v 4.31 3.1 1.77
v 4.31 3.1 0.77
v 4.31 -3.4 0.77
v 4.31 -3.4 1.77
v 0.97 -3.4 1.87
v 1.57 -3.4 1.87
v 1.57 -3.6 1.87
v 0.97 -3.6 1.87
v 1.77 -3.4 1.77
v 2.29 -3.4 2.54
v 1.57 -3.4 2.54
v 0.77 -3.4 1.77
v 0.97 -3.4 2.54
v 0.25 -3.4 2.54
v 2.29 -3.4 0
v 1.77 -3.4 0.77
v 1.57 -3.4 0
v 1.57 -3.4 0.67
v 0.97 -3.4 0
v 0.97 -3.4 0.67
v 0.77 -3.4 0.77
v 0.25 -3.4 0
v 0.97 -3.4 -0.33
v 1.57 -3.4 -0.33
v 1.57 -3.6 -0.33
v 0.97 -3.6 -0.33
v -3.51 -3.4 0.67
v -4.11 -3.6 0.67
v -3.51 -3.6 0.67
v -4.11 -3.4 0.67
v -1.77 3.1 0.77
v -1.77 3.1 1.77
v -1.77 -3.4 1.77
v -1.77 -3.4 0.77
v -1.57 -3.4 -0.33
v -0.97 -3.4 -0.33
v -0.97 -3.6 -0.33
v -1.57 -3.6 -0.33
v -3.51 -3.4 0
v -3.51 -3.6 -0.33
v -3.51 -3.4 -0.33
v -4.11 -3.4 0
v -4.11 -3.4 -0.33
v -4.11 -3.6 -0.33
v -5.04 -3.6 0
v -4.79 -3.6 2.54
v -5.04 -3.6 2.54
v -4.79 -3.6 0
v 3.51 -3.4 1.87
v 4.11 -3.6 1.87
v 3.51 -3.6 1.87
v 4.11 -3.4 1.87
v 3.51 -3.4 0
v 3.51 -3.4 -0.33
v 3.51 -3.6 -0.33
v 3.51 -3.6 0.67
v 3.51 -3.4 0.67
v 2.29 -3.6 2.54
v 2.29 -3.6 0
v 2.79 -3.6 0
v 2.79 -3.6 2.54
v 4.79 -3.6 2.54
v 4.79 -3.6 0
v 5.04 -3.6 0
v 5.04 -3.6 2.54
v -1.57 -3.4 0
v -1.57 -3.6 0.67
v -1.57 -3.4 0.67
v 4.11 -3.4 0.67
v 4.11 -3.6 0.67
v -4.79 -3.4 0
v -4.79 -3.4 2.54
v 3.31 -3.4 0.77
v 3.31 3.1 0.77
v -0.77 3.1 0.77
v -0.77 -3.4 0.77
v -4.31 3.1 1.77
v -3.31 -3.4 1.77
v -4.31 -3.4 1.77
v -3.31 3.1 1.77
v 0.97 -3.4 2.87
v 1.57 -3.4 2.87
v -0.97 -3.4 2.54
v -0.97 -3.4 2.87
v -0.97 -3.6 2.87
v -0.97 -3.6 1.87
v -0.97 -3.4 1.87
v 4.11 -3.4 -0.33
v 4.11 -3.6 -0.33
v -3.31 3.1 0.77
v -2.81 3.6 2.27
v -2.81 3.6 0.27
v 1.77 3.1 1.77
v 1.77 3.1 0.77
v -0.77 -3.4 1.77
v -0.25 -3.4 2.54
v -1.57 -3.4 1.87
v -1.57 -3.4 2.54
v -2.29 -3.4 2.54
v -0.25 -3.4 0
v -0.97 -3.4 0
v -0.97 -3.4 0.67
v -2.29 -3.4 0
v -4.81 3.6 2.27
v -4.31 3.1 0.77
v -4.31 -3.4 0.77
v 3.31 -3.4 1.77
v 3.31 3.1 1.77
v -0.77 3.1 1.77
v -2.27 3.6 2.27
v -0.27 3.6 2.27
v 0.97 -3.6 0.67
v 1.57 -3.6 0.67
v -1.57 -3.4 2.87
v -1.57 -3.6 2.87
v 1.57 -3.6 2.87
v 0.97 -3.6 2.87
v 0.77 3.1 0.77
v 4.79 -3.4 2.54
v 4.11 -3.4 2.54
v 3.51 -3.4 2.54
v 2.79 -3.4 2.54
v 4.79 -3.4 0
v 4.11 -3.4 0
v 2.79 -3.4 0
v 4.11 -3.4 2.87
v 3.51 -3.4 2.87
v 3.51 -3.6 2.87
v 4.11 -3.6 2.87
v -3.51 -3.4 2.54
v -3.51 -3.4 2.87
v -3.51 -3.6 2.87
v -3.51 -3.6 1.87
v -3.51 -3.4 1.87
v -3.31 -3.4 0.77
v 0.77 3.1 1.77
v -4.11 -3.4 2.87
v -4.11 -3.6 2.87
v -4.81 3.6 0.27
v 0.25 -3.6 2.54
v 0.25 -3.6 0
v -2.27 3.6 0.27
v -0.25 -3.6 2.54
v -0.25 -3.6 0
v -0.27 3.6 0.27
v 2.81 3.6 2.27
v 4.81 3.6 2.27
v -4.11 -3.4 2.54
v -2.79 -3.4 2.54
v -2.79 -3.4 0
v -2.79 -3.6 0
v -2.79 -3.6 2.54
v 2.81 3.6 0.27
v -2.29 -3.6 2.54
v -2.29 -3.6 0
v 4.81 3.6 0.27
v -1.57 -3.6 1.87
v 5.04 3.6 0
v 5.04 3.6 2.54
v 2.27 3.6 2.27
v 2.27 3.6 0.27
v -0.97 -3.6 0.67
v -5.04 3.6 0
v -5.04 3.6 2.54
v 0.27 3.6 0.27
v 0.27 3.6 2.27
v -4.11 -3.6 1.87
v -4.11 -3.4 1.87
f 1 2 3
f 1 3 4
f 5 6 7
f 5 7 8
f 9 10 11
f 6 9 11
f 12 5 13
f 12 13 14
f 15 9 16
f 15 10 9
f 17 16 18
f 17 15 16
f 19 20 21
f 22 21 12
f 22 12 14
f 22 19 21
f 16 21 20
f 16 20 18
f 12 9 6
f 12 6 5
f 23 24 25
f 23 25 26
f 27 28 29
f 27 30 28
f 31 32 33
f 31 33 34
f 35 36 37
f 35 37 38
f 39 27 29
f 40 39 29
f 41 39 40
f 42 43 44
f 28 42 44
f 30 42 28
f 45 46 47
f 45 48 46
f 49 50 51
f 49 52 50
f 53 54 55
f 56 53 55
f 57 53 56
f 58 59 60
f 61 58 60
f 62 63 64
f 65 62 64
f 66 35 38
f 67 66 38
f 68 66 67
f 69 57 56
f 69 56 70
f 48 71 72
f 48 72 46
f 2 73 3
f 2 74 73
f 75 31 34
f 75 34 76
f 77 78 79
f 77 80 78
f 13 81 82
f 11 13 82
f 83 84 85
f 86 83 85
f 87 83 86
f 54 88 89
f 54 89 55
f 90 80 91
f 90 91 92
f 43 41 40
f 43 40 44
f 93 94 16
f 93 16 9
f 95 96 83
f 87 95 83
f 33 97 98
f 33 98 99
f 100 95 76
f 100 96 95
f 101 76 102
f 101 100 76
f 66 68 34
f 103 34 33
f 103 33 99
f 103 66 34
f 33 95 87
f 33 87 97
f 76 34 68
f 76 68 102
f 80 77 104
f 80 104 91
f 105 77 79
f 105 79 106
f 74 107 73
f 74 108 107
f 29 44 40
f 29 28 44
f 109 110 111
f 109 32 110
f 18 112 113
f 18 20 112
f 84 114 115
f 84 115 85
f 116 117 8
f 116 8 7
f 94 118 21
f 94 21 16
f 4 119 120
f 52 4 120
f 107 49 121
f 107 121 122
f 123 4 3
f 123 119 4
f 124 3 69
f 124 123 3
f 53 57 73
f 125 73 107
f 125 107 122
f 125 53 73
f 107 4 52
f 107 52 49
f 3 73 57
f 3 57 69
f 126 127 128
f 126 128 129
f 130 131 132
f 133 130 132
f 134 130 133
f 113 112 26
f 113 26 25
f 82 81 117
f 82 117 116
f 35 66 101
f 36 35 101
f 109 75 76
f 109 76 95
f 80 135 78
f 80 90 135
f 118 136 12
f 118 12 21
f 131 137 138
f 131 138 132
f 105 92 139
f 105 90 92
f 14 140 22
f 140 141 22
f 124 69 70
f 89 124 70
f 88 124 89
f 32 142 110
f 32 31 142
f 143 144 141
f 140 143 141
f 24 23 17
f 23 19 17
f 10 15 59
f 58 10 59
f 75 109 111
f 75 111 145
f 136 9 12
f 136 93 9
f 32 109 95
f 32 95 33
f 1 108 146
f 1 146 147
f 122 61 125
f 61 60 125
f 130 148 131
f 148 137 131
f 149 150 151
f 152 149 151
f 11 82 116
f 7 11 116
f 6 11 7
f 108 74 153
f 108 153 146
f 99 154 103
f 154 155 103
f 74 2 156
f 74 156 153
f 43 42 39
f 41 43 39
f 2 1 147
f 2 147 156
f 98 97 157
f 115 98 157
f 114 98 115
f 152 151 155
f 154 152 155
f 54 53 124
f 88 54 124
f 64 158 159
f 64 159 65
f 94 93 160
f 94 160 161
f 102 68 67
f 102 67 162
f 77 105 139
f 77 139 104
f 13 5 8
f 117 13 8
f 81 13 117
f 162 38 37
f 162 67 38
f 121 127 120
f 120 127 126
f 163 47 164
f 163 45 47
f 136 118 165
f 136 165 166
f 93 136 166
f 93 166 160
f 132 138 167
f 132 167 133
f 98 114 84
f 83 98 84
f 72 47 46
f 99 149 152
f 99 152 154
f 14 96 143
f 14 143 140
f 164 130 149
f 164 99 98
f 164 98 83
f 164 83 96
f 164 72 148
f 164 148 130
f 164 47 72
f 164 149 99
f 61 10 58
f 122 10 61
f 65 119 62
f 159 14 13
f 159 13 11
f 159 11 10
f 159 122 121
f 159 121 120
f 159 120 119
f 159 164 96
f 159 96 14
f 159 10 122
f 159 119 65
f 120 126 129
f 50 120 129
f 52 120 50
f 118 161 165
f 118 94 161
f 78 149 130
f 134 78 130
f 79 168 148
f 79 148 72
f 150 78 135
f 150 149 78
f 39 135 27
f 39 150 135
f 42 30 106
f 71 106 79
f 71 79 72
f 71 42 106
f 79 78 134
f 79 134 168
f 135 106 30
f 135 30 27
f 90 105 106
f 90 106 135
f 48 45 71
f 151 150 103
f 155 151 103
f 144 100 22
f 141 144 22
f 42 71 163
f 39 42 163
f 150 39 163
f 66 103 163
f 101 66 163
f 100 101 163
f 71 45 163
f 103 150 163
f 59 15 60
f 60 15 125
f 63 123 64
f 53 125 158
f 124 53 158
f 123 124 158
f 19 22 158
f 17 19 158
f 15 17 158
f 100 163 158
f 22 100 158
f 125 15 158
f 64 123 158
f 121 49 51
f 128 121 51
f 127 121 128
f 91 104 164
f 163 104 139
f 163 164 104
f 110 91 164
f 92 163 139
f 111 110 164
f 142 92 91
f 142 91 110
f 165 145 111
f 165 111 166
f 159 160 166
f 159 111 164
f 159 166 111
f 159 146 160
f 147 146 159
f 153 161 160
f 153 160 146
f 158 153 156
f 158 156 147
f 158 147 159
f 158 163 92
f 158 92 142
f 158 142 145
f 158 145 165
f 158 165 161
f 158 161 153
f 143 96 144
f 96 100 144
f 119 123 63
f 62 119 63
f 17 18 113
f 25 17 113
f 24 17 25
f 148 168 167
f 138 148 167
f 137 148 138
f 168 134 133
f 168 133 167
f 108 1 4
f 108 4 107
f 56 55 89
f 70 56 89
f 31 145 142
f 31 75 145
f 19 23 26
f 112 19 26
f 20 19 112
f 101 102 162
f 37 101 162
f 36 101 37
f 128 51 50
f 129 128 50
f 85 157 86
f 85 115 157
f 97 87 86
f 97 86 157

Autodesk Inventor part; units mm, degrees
ref_plane "YZ Plane" through (0, 0, 0) normal (1, 0, 0) x (0, 1, 0)
ref_plane "XZ Plane" through (0, 0, 0) normal (0, 1, 0) x (-1, 0, 0)
ref_plane "XY Plane" through (0, 0, 0) normal (0, 0, 1) x (1, 0, 0)
sketch "Sketch1" plane through (0, 0, 0) normal (0, 0, 1) x (1, 0, 0)
  line L0 (-5.04, 3.6) -> (5.04, 3.6)
  line L1 (5.04, 3.6) -> (5.04, -3.6)
  line L2 (-5.04, -3.6) -> (-5.04, 3.6)
  line L3 (-2.79, -3.4) -> (-2.79, -3.6)
  line L4 (-2.79, -3.6) -> (-2.29, -3.6)
  line L5 (-2.29, -3.6) -> (-2.29, -3.4)
  line L6 (-0.25, -3.4) -> (-0.25, -3.6)
  line L7 (-0.25, -3.6) -> (0.25, -3.6)
  line L8 (0.25, -3.6) -> (0.25, -3.4)
  line L9 (2.29, -3.4) -> (2.29, -3.6)
  line L10 (2.29, -3.6) -> (2.79, -3.6)
  line L11 (2.79, -3.6) -> (2.79, -3.4)
  line L12 (-2.79, -3.4) -> (-4.79, -3.4)
  line L13 (-0.25, -3.4) -> (-2.29, -3.4)
  line L14 (4.79, -3.4) -> (2.79, -3.4)
  line L15 (2.29, -3.4) -> (0.25, -3.4)
  line L16 (0, 1.3653) -> (0, -1.7187) construction
  line L17 (-4.79, -3.4) -> (-4.79, -3.6)
  line L18 (-4.79, -3.6) -> (-5.04, -3.6)
  line L19 (4.79, -3.4) -> (4.79, -3.6)
  line L20 (4.79, -3.6) -> (5.04, -3.6)
  point P0 (0, 0)
  point P1 (0, 3.6)
  point P2 (-5.04, 0)
  point P3 (0, -3.6)
  point P4 (-2.54, -3.6)
  point P5 (-2.54, -3.6)
  point P6 (5.04, 0)
  dimension "d0" = 0.5
  dimension "d1" = 0.2
  dimension "d3" = 10.08
  dimension "d4" = 2.54
  dimension "d20" = 7
  dimension "d21" = 0.25
extrude "Extrusion1" add sketch "Sketch1" along normal blind 2.54
sketch "Sketch3" plane through (-5.04, -3.4, 0) normal (0, -1, 0) x (1, 0, 0)
  line L0 (0.93, 2.87) -> (1.53, 2.87)
  line L1 (1.53, 2.87) -> (1.53, 1.87)
  line L2 (1.53, 1.87) -> (0.93, 1.87)
  line L3 (0.93, 1.87) -> (0.93, 2.87)
  line L4 (0.93, 0.67) -> (1.53, 0.67)
  line L5 (1.53, 0.67) -> (1.53, -0.33)
  line L6 (1.53, -0.33) -> (0.93, -0.33)
  line L7 (0.93, -0.33) -> (0.93, 0.67)
  line L8 (3.47, 2.87) -> (4.07, 2.87)
  line L9 (4.07, 2.87) -> (4.07, 1.87)
  line L10 (4.07, 1.87) -> (3.47, 1.87)
  line L11 (3.47, 1.87) -> (3.47, 2.87)
  line L12 (3.47, 0.67) -> (4.07, 0.67)
  line L13 (4.07, 0.67) -> (4.07, -0.33)
  line L14 (4.07, -0.33) -> (3.47, -0.33)
  line L15 (3.47, -0.33) -> (3.47, 0.67)
  line L16 (6.01, 2.87) -> (6.61, 2.87)
  line L17 (6.61, 2.87) -> (6.61, 1.87)
  line L18 (6.61, 1.87) -> (6.01, 1.87)
  line L19 (6.01, 1.87) -> (6.01, 2.87)
  line L20 (6.01, 0.67) -> (6.61, 0.67)
  line L21 (6.61, 0.67) -> (6.61, -0.33)
  line L22 (6.61, -0.33) -> (6.01, -0.33)
  line L23 (6.01, -0.33) -> (6.01, 0.67)
  line L24 (8.55, 2.87) -> (9.15, 2.87)
  line L25 (9.15, 2.87) -> (9.15, 1.87)
  line L26 (9.15, 1.87) -> (8.55, 1.87)
  line L27 (8.55, 1.87) -> (8.55, 2.87)
  line L28 (8.55, 0.67) -> (9.15, 0.67)
  line L29 (9.15, 0.67) -> (9.15, -0.33)
  line L30 (9.15, -0.33) -> (8.55, -0.33)
  line L31 (8.55, -0.33) -> (8.55, 0.67)
  line L32 (4.79, 0) -> (2.75, 0) projected
  line L33 (6.0777, 1.27) -> (8.8799, 1.27) construction
  line L34 (0, 0) -> (0, 2.54) projected
  line L35 (0, 0) -> (0, 2.54) projected
  point P0 (5.04, 0)
  point P1 (1.23, -0.33)
  point P2 (3.77, -0.33)
  point P3 (6.31, -0.33)
  point P4 (8.85, -0.33)
  point P5 (3.77, -0.33)
  point P6 (1.23, -0.33)
  point P7 (6.31, -0.33)
  point P8 (8.85, -0.33)
  point P9 (3.77, 0)
  point P10 (0, 1.27)
  dimension "d11" = 3.2
  dimension "d12" = 0.6
  dimension "d13" = 2.54
  dimension "d14" = 2.54
  dimension "d15" = 2.54
  dimension "d16" = 1
extrude "Extrusion3" add sketch "Sketch3" along normal blind 0.2
sketch "Sketch5" plane through (-5.04, 3.6, 0) normal (0, 1, 0) x (1, 0, 0)
  line L0 (0, 0) -> (10.08, 0) projected
  line L1 (0, 0) -> (0, -2.54) projected
  line L2 (10.08, -2.54) -> (0, -2.54) projected
  line L3 (10.08, 0) -> (10.08, -2.54) projected
  line L4 (0.73, -0.77) -> (1.73, -0.77)
  line L5 (1.73, -0.77) -> (1.73, -1.77)
  line L6 (1.73, -1.77) -> (0.73, -1.77)
  line L7 (0.73, -1.77) -> (0.73, -0.77)
  line L8 (1.53, 0.33) -> (0.93, 0.33) projected
  point P0 (5.04, 0)
  point P1 (0.73, -1.27)
  point P2 (0, -1.27)
  point P3 (1.23, -0.77)
  point P4 (1.23, 0.33)
  dimension "d23" = 1
extrude "Extrusion4" cut sketch "Sketch5" against normal blind 7 contours L4 L5 L6 L7
chamfer "Chamfer1" distance 0.5 angle 45 4 edges at (-3.81, 3.6, 0.77) (-3.31, 3.6, 1.27) (-4.31, 3.6, 1.27) (-3.81, 3.6, 1.77)
pattern_linear "Rectangular Pattern1" count 4 spacing 2.54 along (1, 0, 0) of "Extrusion4", "Chamfer1"
equation "\"d14\" = d13"
equation "\"d15\" = d13"
properties part number "fciconnect-91601-304"
